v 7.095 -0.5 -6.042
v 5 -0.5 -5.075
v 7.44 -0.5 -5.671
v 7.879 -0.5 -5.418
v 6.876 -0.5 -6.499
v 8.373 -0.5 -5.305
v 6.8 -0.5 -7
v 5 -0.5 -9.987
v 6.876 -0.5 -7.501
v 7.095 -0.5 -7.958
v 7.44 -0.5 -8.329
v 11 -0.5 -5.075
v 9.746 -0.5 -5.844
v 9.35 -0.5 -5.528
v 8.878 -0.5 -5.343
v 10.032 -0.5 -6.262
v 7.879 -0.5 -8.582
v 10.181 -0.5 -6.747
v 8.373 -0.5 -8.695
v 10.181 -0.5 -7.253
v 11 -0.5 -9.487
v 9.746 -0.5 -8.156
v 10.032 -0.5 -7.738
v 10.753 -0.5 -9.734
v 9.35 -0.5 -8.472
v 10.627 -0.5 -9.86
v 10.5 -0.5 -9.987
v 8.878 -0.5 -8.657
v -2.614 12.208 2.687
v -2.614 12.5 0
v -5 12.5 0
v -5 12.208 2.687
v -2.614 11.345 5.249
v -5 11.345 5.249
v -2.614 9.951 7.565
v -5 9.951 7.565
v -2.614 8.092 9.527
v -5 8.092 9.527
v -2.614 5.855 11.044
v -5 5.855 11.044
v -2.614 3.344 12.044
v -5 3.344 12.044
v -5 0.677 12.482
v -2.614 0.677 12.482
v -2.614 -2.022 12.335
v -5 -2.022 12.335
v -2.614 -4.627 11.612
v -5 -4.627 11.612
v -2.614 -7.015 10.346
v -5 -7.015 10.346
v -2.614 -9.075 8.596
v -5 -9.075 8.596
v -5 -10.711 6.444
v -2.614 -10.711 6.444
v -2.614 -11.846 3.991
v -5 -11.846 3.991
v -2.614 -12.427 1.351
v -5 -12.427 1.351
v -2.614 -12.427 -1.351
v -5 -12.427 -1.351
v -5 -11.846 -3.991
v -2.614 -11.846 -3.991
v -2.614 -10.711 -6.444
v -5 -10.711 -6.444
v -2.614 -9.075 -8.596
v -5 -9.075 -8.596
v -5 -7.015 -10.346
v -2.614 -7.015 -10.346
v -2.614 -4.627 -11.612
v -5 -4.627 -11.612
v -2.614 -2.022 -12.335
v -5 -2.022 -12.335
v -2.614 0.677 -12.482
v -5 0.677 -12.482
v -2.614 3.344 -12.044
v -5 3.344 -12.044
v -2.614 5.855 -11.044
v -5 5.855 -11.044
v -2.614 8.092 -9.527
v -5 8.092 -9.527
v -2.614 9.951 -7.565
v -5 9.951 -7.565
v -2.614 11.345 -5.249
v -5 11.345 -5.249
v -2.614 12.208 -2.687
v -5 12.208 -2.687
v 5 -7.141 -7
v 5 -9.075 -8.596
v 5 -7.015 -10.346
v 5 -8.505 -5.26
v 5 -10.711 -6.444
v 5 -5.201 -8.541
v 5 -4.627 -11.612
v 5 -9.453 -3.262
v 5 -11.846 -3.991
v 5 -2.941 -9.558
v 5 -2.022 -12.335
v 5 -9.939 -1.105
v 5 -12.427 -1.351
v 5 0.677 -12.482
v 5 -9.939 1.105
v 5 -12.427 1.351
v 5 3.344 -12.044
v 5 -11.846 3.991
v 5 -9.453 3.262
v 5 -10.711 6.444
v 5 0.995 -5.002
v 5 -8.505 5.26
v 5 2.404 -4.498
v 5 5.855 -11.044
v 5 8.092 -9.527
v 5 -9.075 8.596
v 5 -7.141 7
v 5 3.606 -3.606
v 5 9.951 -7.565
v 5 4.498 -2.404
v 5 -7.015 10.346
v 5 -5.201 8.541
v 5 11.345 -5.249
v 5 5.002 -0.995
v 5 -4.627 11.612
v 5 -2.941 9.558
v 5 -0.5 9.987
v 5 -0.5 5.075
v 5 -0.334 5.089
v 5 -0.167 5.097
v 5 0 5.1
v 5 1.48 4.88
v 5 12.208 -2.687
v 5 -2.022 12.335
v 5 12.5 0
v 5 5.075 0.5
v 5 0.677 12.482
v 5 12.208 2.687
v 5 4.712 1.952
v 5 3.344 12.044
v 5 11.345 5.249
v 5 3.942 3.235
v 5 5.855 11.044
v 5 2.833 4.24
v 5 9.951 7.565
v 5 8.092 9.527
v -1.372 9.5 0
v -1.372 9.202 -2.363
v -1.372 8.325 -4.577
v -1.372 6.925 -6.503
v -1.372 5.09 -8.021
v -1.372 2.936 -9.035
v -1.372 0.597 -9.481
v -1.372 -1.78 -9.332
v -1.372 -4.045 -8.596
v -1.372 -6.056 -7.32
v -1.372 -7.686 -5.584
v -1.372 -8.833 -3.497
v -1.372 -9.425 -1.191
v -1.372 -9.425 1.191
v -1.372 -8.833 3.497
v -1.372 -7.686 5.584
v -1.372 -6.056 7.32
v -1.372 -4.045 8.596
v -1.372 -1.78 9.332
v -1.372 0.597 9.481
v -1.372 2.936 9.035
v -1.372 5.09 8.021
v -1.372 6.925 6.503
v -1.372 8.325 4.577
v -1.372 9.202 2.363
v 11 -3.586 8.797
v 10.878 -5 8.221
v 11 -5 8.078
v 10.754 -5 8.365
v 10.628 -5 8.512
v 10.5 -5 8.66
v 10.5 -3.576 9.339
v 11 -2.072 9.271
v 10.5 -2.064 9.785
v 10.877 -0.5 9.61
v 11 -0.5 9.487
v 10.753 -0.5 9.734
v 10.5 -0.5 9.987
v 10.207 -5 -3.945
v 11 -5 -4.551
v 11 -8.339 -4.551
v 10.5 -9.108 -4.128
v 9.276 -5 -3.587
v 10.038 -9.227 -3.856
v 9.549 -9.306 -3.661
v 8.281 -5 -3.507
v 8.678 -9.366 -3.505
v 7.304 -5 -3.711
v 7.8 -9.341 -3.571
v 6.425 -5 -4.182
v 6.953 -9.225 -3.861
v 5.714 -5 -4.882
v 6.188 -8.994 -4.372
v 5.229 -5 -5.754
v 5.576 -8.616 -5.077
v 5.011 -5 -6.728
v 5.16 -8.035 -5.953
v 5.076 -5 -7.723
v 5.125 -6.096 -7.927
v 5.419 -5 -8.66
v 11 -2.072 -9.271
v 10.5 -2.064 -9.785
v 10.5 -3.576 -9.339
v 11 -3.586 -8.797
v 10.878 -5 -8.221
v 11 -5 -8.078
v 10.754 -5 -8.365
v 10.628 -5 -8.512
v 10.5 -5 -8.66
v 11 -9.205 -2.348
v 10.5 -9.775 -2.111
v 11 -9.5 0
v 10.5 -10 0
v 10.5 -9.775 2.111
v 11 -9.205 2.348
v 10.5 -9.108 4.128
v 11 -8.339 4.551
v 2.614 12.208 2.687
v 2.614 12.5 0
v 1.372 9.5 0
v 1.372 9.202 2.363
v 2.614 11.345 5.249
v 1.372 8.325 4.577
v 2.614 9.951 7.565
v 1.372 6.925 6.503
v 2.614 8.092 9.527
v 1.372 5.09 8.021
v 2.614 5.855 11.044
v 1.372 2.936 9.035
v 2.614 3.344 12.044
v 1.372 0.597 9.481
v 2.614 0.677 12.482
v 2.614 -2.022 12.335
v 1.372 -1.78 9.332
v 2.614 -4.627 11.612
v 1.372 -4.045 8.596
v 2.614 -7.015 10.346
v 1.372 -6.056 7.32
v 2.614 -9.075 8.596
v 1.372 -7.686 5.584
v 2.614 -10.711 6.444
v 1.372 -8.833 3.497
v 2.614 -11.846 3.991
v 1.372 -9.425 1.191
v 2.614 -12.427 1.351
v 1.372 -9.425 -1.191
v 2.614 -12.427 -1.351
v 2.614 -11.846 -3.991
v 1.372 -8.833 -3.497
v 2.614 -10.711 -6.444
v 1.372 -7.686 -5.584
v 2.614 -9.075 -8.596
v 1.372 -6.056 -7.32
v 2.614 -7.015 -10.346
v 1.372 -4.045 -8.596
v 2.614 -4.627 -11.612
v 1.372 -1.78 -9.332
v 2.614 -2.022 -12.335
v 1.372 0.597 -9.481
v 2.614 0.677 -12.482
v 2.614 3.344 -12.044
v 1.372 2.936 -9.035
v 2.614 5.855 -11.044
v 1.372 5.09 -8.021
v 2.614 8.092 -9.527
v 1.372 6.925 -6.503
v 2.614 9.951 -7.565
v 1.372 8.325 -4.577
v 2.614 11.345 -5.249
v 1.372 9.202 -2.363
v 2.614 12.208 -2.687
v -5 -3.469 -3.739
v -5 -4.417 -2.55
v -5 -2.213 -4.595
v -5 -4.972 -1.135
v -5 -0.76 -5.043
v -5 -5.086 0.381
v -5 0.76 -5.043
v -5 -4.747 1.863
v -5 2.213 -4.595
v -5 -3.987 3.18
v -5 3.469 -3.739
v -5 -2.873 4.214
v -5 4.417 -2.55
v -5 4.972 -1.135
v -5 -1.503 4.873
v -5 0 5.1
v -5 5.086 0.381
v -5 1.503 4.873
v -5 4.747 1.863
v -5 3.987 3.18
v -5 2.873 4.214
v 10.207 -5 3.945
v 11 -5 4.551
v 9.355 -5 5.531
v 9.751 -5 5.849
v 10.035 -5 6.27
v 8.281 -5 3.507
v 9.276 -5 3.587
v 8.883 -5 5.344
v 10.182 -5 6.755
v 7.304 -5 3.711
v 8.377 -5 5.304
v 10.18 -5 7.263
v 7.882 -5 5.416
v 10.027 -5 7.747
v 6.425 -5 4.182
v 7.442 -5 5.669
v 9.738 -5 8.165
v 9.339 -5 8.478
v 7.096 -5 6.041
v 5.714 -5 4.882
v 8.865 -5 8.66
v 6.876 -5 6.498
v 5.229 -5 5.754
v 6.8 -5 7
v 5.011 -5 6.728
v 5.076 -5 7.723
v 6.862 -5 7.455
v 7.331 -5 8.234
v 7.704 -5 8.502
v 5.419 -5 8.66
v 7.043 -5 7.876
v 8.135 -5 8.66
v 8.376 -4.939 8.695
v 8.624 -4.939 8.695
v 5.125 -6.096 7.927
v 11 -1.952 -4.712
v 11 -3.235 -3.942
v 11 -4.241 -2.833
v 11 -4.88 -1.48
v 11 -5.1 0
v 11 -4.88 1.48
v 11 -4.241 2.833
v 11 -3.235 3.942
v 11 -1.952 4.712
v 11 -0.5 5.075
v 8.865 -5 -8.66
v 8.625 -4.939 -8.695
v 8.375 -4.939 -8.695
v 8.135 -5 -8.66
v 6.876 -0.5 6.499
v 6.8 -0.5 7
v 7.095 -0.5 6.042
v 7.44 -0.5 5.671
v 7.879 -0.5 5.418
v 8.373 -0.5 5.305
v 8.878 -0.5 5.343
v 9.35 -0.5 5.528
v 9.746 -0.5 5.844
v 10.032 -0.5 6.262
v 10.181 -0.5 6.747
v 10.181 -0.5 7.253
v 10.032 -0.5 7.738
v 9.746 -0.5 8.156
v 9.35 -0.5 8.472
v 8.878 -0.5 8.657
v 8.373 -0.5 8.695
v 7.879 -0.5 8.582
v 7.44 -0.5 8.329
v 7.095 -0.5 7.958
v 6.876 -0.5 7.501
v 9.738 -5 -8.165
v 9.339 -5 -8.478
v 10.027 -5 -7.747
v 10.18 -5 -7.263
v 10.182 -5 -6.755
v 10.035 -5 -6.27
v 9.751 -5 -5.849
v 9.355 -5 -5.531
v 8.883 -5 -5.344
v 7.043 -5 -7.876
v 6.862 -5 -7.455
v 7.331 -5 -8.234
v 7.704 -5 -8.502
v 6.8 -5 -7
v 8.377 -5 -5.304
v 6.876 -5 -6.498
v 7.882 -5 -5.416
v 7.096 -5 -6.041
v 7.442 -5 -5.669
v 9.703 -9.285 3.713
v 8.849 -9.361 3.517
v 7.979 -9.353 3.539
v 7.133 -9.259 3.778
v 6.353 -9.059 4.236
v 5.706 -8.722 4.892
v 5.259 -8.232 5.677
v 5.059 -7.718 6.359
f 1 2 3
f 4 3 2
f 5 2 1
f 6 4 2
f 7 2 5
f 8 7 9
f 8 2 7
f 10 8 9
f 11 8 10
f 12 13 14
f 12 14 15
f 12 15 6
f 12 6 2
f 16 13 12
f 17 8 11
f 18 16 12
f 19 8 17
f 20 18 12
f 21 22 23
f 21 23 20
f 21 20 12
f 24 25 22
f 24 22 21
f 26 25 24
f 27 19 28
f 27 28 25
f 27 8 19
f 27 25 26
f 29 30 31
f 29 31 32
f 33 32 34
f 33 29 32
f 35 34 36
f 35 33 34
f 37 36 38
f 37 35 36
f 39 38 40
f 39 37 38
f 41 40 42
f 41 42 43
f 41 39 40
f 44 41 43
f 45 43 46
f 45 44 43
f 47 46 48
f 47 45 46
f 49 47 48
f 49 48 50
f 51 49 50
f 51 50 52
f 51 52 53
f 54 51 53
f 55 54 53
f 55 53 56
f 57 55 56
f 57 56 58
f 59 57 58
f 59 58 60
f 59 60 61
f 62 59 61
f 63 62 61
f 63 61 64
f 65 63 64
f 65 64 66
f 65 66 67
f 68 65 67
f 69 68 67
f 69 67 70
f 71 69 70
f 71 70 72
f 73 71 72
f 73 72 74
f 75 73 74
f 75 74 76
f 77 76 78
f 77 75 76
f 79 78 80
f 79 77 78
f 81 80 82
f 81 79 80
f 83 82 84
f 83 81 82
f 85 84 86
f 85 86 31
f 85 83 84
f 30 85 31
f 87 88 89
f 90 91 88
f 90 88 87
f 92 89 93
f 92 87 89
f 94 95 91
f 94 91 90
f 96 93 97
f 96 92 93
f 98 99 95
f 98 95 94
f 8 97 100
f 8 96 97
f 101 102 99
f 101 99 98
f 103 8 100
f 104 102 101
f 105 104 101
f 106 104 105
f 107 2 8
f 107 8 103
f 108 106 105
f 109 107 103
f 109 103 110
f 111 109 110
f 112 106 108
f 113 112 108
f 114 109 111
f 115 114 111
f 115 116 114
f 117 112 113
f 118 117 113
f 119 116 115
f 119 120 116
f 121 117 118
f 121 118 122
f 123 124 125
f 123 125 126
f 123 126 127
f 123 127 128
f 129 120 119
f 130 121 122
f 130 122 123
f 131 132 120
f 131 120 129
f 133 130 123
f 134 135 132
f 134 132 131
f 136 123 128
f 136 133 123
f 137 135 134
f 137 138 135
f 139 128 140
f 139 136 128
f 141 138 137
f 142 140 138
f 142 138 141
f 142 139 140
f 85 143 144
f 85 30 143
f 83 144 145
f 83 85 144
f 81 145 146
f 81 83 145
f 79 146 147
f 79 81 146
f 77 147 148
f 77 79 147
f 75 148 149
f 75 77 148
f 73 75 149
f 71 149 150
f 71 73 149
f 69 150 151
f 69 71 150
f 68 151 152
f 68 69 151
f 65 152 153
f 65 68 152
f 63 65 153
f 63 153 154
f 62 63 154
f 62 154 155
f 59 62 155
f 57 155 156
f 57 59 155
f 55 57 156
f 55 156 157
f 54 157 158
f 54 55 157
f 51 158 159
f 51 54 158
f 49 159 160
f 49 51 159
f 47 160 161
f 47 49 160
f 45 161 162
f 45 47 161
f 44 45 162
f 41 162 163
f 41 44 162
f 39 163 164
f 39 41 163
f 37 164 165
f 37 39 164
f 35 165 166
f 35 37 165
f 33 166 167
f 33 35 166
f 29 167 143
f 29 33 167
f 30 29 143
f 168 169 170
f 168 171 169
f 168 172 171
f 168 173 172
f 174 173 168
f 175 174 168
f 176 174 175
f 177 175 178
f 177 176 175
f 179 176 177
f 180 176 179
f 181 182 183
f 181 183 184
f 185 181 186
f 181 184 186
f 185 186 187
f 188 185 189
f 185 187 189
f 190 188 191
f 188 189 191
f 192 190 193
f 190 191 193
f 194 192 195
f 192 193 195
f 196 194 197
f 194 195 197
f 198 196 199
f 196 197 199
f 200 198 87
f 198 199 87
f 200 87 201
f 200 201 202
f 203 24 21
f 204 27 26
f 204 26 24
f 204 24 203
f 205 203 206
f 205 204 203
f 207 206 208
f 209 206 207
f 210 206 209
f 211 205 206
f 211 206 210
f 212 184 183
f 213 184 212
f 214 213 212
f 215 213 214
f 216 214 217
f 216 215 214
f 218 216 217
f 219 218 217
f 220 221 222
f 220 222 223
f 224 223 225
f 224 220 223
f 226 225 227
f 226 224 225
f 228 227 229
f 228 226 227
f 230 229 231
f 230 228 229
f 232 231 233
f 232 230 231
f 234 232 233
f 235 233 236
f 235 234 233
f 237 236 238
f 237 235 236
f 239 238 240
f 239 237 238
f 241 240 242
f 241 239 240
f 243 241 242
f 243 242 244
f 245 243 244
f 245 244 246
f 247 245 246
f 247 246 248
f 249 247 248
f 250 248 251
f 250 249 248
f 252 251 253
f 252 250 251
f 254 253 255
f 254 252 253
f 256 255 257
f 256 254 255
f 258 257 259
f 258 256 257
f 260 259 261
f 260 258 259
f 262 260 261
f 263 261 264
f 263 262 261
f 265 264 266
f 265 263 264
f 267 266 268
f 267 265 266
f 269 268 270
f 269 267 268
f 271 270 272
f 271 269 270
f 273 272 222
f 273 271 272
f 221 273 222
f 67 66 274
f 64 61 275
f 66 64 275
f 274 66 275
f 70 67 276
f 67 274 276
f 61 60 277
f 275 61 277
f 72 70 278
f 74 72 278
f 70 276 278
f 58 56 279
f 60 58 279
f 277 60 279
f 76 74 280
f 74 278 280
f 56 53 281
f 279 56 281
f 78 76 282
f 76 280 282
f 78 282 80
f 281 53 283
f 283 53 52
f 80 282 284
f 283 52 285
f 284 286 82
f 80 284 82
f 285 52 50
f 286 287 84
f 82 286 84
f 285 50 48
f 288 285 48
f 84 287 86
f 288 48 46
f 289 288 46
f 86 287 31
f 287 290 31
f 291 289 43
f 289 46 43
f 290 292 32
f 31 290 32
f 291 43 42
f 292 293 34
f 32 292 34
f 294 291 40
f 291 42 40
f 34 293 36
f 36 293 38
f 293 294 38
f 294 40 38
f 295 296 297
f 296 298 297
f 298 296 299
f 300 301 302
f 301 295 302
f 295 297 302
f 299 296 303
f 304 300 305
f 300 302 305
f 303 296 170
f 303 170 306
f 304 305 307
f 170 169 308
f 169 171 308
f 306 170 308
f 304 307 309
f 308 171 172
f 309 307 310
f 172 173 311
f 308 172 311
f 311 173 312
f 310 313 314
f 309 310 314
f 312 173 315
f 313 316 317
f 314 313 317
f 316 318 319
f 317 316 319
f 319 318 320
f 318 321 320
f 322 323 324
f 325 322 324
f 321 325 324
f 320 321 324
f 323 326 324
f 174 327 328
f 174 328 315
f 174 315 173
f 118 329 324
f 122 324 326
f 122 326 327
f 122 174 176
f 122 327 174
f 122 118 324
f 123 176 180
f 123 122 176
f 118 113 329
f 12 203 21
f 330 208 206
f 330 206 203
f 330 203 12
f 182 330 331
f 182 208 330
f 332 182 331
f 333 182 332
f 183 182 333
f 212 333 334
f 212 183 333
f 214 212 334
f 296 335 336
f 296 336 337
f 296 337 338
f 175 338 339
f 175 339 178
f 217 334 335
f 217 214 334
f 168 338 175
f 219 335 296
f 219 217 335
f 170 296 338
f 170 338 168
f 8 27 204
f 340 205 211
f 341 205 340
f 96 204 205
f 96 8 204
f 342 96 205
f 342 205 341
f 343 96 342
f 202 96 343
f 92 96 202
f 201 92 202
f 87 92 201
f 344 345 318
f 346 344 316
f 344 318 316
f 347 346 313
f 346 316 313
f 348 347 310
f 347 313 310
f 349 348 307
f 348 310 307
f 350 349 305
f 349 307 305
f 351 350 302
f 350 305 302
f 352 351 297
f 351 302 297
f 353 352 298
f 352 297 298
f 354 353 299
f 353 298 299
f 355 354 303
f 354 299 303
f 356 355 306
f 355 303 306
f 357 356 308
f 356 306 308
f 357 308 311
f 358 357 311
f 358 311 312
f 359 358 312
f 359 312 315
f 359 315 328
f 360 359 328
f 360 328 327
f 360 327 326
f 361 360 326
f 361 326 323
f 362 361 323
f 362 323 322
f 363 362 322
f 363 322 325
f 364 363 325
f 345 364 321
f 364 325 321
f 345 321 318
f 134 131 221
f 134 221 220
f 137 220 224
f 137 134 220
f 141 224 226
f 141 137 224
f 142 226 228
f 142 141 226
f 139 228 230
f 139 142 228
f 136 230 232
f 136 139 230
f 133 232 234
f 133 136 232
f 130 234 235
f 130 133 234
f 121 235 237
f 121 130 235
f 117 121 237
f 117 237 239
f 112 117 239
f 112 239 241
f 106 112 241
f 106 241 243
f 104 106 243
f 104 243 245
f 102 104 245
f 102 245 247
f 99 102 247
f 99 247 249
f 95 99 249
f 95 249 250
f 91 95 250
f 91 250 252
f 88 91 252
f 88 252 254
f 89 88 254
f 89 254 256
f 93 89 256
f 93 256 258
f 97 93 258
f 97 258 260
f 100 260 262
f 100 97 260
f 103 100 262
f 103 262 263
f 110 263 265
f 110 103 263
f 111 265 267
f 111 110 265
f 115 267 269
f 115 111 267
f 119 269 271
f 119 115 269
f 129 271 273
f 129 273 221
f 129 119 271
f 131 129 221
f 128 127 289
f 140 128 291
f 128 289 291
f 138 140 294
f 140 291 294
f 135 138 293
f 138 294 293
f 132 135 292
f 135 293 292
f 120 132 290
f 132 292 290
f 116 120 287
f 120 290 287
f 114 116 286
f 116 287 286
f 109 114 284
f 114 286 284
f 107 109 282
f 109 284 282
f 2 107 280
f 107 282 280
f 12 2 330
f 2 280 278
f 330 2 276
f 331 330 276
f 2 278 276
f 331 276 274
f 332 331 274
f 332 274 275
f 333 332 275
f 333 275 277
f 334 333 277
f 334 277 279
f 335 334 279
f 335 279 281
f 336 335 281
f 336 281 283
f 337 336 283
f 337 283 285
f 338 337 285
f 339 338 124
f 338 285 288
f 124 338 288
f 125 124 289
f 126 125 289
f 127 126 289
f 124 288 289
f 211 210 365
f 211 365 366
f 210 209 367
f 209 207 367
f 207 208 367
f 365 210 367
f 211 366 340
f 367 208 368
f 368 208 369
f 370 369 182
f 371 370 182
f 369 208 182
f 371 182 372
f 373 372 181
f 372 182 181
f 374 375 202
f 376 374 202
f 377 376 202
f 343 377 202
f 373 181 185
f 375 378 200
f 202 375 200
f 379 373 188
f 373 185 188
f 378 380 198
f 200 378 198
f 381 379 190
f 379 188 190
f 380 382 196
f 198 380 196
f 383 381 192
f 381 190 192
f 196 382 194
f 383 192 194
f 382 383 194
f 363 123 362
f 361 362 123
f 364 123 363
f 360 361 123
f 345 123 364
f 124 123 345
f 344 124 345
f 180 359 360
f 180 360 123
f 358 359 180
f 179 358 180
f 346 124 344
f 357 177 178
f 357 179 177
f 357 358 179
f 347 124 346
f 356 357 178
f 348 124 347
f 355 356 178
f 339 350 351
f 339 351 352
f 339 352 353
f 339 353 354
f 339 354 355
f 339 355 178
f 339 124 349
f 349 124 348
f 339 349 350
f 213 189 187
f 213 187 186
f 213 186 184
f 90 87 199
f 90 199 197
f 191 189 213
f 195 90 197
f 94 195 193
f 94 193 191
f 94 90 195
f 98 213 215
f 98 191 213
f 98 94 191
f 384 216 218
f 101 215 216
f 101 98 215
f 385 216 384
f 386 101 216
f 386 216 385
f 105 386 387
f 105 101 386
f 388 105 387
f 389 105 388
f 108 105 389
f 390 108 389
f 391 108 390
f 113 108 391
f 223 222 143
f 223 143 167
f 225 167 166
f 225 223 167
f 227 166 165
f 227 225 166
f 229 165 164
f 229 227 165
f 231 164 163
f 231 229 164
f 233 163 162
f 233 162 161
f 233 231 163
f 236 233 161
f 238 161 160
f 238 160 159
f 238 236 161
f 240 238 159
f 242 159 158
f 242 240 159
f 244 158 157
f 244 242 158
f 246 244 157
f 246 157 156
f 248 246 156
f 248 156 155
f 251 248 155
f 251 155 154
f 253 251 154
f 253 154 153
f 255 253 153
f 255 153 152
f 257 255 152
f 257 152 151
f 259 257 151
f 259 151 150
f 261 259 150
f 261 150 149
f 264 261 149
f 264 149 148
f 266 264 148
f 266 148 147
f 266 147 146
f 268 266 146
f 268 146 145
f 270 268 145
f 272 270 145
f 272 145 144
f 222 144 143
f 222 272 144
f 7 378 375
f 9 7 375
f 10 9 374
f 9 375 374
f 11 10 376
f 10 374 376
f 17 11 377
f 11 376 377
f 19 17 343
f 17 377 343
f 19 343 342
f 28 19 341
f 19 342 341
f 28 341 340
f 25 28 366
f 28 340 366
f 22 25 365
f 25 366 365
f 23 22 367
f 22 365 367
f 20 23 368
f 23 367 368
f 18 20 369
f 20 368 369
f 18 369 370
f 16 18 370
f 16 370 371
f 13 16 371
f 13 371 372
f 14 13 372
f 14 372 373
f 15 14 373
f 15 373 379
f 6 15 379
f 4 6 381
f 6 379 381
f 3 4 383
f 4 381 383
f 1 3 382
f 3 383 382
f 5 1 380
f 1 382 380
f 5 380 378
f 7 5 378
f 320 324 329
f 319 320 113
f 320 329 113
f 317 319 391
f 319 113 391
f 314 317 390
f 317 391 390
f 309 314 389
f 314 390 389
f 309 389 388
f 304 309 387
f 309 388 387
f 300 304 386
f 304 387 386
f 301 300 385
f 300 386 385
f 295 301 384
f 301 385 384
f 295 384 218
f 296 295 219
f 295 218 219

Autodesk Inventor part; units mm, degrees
sketch "Sketch_1" plane through (0, 0, 0) normal (0, 0, 1) x (1, 0, 0)
  line L0 (5, 0) -> (-5, 0)
  line L1 (-5, 0) -> (-5, 12.5)
  line L2 (-5, 12.5) -> (-2.6142, 12.5)
  line L3 (-2.6142, 12.5) -> (-1.3716, 9.5)
  line L4 (-1.3716, 9.5) -> (1.3716, 9.5)
  line L5 (1.3716, 9.5) -> (2.6142, 12.5)
  line L6 (2.6142, 12.5) -> (5, 12.5)
  line L7 (5, 12.5) -> (5, 0)
  line L8 (5, 0) -> (-5, 0)
revolve "Revolution1" add sketch "Sketch_1" angle 360 about axis through (5, 0, 0) along (1, 0, 0)
sketch "Sketch_2" plane through (0, 0, 0) normal (0, 0, 1) x (1, 0, 0)
  line L0 (5, 0) -> (11, 0)
  line L1 (11, 0) -> (11, -9.5)
  line L2 (11, -9.5) -> (10.5, -10)
  line L3 (10.5, -10) -> (5, -10)
  line L4 (5, -10) -> (5, 0)
  line L5 (5, 0) -> (11, 0)
revolve "Revolution2" add sketch "Sketch_2" angle 180 mid plane about axis through (5, 0, 0) along (1, 0, 0)
sketch "Sketch_3" plane through (0, 0, 0) normal (0, 0, 1) x (1, 0, 0)
  line L0 (5, -0.5) -> (11, -0.5)
  line L1 (11, -0.5) -> (11, 0)
  line L2 (11, 0) -> (5, 0)
  line L3 (5, 0) -> (5, -0.5)
extrude "Extrusion1" cut sketch "Sketch_3" along normal mid plane 40
sketch "Sketch_9" plane through (8.5, 0, 0) normal (1, 0, 0) x (0, 0, -1)
  line L0 (7, -10) -> (7, -0.5)
  line L1 (7, -0.5) -> (8.5, -0.5)
  line L2 (8.5, -0.5) -> (8.2295, -0.7705)
  line L3 (8.2295, -0.7705) -> (8.2295, -9.7295)
  line L4 (8.2295, -9.7295) -> (8.5, -10)
  line L5 (8.5, -10) -> (7, -10)
  line L6 (7, -10) -> (7, -0.5)
revolve "Revolution4" cut sketch "Sketch_9" angle 360 about axis through (8.5, -10, -7) along (0, -1, 0)
sketch "Sketch_6" plane through (8.5, 0, 0) normal (1, 0, 0) x (0, 0, -1)
  line L0 (-7, -10) -> (-7, -0.5)
  line L1 (-7, -0.5) -> (-5.5, -0.5)
  line L2 (-5.5, -0.5) -> (-5.7705, -0.7705)
  line L3 (-5.7705, -0.7705) -> (-5.7705, -9.7295)
  line L4 (-5.7705, -9.7295) -> (-5.5, -10)
  line L5 (-5.5, -10) -> (-7, -10)
  line L6 (-7, -10) -> (-7, -0.5)
revolve "Revolution5" cut sketch "Sketch_6" angle 360 about axis through (8.5, -10, 7) along (0, -1, 0)
ref_plane "part1_to_part2_XY" through (5, 0, 0) normal (1, 0, 0) x (0, 0, -1)
ref_plane "part1_to_part2_YZ" through (5, 0, 0) normal (0, 0, -1) x (0, 1, 0)
ref_plane "part1_to_part2_ZX" through (5, 0, 0) normal (0, 1, 0) x (1, 0, 0)
sketch "スケッチ7" plane through (-5, 0, 0) normal (-1, 0, 0) x (0, 0, 1)
  circle A0 centre (0, 0) radius 5.1
  dimension "d12" = 10.2
extrude "押し出し2" cut sketch "スケッチ7" against normal through all
ref_plane "作業平面4" through (7.75, -10, 0) normal (0, 1, 0) x (-1, 0, 0)
sketch "スケッチ8" plane through (7.75, -10, 0) normal (0, 1, 0) x (-1, 0, 0)
  circle A0 centre (-0.75, 7) radius 1.2295 projected
  circle A1 centre (-0.75, 7) radius 1.7
  circle A2 centre (-0.75, -7) radius 1.5 projected
  circle A3 centre (-0.75, -7) radius 1.7
  circle A4 centre (-0.75, 7) radius 3.5
  circle A5 centre (-0.75, -7) radius 3.5
  point P0 (7.75, 0)
  dimension "d15" = 3.4
  dimension "d16" = 3.4
  dimension "d17" = 7
  dimension "d18" = 7
extrude "押し出し3" cut sketch "スケッチ8" along normal through all contours A0 | A1 | A2 | A3
extrude "押し出し4" cut sketch "スケッチ8" along normal blind 5 contours A0 | A1 | A2 | A3 | A4 | A5
properties part number "MBRDAC23-2-8_p1"
